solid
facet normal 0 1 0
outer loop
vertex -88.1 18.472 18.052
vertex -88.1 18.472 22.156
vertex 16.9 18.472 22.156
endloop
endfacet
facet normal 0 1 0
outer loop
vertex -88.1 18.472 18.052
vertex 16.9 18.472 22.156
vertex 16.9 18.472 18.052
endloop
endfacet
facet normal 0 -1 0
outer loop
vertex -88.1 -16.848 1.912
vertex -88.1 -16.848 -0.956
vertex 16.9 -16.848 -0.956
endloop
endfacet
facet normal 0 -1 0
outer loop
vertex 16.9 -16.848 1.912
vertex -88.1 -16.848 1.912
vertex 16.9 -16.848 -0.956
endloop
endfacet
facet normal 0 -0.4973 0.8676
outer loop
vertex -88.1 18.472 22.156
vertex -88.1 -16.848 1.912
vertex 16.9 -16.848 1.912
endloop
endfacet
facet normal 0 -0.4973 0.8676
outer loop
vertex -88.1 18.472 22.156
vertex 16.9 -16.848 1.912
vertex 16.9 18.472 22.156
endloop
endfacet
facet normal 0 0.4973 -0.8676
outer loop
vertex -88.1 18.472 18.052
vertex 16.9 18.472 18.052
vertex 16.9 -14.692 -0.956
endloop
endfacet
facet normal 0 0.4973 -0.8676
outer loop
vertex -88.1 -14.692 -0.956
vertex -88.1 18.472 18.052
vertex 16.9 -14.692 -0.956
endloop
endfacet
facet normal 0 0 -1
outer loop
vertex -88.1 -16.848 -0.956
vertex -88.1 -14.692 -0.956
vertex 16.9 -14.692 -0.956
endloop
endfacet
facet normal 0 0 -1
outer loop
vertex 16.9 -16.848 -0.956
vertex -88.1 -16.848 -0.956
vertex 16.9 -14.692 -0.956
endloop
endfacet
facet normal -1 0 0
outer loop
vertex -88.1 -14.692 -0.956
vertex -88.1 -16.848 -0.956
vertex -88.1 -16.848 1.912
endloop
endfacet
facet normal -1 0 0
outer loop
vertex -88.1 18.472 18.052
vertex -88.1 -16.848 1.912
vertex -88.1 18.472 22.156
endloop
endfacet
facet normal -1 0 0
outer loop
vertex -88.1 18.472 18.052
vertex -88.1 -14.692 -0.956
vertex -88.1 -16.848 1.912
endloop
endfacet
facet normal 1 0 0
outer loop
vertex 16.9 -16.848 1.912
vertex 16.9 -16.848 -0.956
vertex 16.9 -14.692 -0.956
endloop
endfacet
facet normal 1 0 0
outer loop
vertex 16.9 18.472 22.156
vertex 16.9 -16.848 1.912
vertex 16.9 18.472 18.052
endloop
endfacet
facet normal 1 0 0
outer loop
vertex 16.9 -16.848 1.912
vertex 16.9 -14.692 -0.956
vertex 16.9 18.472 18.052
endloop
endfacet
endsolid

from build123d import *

# Parameters (mm, degrees)
F0_W     = 70
F0_H     = 28.9502215247
F1_DEPTH = 17.5
F3_DEPTH = 70.001
F5_DEPTH = 70.001
F6_SCALE = 1.5


with BuildPart() as f1:
    # F0 (on Top) → F1 (new body)
    with BuildSketch(Plane.XY):
        with Locations((-18.1001285091, -2.3733787239)):
            Rectangle(F0_W, F0_H)
    extrude(amount=F1_DEPTH)

    # F2 (on face) → F3 (cut, through all)
    with BuildSketch(Plane.YZ.offset(16.8998714909)):
        Polygon((-16.8484894862, 17.5), (-16.8484894862, 1.9115059404), (10.3485193104, 17.5), align=None)
        Polygon((12.1017320385, 15.7691705972), (-15.4105003687, 0), (12.1017320385, 0), align=None)
    extrude(amount=-F3_DEPTH, mode=Mode.SUBTRACT)

    # F4 (on face) → F5 (cut, through all)
    with BuildSketch(Plane.YZ.offset(16.8998714909)):
        Polygon((10.3485193104, 17.5), (6.6982309879, 15.4077663189), (6.6982309879, 12.6720489741), (12.1017320385, 15.7691705972), (12.1017320385, 17.5), align=None)
    extrude(amount=-F5_DEPTH, mode=Mode.SUBTRACT)


with BuildPart() as f1_1:
    # F6: moved
    add(f1.part.scale(F6_SCALE).moved(Location((-8.4499357454, 8.4242447431, -0.9557529702))))


solid = f1_1.part
